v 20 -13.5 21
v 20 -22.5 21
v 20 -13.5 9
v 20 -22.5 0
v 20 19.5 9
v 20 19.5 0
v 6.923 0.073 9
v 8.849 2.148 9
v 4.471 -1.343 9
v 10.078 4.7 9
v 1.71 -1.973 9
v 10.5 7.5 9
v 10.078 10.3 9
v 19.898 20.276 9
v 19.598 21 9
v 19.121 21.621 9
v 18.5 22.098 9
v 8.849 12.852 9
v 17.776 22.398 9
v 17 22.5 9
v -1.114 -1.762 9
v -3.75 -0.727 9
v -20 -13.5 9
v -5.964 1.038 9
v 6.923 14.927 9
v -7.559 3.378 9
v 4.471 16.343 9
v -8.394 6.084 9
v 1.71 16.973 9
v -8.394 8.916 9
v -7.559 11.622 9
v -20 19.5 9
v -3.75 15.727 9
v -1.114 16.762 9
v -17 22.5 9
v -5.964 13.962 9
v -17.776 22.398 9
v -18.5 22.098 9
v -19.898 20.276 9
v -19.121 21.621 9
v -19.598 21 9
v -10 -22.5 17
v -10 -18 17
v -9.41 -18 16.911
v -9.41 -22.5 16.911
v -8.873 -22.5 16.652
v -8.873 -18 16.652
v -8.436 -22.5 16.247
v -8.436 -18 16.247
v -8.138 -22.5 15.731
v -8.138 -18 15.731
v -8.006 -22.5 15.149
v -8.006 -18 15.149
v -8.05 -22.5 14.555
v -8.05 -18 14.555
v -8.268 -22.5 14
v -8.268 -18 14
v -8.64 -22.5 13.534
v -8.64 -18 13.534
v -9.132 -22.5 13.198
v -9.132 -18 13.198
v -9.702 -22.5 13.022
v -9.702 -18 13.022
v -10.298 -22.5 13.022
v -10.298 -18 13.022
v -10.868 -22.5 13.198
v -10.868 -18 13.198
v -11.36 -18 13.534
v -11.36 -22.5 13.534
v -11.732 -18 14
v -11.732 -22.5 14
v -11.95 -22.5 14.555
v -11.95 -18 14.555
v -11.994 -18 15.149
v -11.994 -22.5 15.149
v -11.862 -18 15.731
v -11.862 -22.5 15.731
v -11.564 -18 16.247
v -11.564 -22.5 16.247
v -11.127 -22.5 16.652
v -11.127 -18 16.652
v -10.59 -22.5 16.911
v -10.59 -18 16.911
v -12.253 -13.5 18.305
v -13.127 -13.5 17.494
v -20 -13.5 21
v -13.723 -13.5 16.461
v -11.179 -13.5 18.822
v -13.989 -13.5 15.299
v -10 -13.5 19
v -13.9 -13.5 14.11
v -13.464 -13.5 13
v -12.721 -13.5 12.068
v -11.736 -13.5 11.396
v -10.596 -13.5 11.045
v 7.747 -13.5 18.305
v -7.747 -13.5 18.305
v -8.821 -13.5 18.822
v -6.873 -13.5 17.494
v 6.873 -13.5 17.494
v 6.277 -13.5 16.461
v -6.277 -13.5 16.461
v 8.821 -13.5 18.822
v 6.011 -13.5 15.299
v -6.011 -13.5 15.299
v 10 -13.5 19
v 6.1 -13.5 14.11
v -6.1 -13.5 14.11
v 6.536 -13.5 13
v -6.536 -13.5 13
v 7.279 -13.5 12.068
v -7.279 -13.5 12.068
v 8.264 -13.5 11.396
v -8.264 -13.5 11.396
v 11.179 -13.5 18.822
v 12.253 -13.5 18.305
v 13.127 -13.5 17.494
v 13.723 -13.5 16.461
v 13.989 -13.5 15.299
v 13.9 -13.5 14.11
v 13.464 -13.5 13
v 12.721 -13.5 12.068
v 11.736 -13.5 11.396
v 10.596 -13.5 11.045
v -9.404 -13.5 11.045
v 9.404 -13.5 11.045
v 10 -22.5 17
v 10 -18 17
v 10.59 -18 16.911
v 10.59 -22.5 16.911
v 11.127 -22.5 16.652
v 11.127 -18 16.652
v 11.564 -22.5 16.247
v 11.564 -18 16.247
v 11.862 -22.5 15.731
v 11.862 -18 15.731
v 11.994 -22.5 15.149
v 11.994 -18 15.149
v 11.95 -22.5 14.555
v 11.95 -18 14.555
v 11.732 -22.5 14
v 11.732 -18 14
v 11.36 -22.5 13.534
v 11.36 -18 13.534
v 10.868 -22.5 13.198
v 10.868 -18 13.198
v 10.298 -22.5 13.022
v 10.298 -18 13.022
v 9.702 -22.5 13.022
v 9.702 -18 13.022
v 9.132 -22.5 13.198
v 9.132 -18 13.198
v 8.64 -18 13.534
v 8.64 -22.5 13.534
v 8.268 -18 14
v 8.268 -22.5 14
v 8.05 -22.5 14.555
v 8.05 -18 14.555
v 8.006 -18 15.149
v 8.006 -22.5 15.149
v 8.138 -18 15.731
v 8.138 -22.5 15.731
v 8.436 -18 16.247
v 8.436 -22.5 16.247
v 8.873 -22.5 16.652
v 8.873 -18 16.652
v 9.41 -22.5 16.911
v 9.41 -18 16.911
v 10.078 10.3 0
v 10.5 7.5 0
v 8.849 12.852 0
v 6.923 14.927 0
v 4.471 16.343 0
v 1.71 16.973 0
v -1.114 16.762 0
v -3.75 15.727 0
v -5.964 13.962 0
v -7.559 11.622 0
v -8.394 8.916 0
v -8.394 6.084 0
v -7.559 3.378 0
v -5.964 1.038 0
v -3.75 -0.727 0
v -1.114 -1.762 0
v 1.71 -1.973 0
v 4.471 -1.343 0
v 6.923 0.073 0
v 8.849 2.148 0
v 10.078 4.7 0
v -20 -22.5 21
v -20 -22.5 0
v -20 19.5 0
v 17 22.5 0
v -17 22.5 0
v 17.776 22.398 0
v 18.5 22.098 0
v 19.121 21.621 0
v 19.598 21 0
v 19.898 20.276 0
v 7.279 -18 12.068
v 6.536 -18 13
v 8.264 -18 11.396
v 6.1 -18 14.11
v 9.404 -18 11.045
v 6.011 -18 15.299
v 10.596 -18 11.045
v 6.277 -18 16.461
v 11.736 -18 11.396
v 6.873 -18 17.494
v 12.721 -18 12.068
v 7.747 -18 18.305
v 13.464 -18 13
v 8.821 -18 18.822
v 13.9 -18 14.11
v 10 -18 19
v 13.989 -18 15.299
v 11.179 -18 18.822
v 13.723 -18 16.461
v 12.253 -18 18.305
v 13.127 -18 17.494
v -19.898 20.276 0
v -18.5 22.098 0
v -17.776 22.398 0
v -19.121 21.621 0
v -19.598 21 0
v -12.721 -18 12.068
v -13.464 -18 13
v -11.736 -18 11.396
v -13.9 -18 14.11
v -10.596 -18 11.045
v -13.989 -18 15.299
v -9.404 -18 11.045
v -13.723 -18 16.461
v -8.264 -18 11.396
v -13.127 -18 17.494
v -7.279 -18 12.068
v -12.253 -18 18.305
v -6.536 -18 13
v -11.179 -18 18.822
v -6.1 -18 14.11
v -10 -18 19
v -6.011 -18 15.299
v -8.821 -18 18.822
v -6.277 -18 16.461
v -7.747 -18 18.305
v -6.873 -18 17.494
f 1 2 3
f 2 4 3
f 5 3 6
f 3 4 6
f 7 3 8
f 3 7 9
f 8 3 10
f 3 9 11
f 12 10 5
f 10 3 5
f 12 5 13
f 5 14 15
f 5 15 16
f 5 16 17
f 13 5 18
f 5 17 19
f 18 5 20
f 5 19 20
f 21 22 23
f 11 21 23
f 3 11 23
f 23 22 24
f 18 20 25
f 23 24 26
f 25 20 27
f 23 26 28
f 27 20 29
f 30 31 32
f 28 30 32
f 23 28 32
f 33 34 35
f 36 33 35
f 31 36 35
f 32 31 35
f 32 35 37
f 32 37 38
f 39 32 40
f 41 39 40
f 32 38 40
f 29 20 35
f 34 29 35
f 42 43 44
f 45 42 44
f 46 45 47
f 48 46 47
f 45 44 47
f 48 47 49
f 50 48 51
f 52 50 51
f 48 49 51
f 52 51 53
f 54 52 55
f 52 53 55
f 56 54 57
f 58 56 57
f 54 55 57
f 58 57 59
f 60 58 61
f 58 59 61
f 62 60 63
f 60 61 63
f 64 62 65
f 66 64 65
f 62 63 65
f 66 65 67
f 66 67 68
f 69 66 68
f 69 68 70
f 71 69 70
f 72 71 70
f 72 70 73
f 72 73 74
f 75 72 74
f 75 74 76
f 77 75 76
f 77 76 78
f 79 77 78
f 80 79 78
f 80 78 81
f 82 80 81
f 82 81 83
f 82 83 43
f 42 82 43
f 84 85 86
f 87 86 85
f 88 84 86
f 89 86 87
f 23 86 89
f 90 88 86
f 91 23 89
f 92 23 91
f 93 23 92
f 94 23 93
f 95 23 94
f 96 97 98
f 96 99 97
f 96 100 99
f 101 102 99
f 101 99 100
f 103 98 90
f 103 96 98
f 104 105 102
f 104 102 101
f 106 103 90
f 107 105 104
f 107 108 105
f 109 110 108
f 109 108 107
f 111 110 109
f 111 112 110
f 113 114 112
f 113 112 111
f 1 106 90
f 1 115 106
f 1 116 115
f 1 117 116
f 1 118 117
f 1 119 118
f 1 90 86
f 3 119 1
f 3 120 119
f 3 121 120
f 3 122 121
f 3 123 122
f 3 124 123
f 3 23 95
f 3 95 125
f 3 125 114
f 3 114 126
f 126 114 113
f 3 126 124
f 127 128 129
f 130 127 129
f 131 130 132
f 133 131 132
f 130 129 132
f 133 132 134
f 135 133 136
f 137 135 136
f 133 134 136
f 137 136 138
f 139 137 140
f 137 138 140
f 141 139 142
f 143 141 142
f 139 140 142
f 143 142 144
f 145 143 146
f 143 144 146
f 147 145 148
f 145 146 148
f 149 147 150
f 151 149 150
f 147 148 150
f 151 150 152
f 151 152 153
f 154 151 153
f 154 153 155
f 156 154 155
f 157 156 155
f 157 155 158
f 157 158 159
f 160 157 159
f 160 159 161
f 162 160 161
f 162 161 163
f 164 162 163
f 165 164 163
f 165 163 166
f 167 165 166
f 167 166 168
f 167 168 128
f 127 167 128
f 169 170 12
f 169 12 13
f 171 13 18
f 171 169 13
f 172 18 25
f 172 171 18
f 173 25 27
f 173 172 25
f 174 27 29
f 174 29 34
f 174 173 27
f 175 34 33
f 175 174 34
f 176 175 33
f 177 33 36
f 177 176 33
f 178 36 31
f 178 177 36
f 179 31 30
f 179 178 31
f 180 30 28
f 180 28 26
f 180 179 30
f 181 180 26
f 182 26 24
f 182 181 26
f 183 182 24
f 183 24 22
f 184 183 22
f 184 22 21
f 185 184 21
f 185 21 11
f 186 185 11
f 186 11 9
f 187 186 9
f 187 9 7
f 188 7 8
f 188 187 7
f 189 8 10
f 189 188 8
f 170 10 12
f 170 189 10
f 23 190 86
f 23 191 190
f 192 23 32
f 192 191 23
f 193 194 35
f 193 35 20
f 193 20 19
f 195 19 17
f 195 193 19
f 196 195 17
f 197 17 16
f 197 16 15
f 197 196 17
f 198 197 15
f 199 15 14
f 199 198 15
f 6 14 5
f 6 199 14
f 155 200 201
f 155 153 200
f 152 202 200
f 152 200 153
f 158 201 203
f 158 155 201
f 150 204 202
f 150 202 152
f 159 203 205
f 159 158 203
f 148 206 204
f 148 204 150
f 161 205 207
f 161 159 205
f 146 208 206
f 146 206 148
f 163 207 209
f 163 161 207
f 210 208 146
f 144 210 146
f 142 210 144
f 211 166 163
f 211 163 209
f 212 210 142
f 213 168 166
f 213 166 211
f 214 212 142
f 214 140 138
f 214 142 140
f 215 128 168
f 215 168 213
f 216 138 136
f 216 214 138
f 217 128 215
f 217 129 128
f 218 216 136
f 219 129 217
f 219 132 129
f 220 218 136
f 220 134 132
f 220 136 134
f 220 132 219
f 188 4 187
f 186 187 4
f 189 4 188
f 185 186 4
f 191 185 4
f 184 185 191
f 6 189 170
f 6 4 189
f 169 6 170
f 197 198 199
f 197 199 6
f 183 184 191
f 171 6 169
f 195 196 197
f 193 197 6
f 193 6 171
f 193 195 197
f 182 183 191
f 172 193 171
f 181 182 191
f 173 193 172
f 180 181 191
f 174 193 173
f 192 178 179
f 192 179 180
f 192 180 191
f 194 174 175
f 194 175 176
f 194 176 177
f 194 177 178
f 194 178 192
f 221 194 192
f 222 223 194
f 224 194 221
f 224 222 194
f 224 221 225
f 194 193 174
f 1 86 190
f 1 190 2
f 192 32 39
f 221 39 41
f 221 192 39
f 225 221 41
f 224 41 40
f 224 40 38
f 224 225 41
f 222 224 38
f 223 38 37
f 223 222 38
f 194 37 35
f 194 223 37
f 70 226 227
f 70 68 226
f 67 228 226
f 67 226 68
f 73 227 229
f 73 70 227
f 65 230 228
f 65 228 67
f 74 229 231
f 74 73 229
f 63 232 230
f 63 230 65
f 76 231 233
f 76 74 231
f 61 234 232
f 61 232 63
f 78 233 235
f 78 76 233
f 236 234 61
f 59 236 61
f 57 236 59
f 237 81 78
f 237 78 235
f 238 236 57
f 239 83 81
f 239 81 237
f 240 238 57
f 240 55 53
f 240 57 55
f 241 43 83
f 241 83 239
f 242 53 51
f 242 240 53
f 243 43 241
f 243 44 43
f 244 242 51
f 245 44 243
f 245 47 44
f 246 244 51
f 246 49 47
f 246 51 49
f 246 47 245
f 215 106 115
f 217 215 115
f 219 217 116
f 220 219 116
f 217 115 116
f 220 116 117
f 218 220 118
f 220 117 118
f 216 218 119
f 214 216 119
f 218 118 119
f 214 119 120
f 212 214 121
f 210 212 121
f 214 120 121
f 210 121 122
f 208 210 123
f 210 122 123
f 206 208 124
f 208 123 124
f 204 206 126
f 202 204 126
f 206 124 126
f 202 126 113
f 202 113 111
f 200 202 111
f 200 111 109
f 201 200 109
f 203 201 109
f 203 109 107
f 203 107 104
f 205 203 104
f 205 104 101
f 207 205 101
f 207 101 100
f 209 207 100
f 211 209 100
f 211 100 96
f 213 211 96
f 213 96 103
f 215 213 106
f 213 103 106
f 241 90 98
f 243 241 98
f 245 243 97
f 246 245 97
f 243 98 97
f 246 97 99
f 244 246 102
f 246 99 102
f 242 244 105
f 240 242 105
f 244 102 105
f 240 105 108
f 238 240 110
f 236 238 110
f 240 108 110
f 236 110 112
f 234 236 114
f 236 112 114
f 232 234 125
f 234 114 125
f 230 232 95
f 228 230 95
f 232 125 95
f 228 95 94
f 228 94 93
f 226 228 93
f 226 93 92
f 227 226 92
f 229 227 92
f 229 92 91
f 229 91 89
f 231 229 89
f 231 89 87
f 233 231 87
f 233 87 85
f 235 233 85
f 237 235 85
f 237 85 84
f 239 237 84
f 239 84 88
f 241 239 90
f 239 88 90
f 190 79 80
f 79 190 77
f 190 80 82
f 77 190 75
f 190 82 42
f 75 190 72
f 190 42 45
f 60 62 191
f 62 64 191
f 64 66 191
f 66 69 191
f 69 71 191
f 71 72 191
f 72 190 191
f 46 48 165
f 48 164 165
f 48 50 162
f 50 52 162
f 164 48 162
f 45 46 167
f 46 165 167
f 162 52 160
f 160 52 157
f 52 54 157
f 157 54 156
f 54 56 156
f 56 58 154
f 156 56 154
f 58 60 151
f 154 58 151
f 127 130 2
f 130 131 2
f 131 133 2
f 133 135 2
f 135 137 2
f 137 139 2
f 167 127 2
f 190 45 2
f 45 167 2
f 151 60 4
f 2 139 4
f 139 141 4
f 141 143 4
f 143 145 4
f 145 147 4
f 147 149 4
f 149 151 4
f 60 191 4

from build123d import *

# Parameters (mm, degrees)
CROQUIS1_R              = 9.5
SALIENTE_EXTRUIR1_DEPTH = 9
CROQUIS3_W              = 40
CROQUIS3_H              = 9
SALIENTE_EXTRUIR2_DEPTH = 12
CROQUIS4_R              = 2
CORTAR_EXTRUIR1_DEPTH   = 47.227697325
CROQUIS5_R              = 4
CORTAR_EXTRUIR2_DEPTH   = 4.5


with BuildPart() as part:
    # Croquis1 → Saliente-Extruir1 (new body)
    with BuildSketch(Plane.XY):
        with BuildLine():
            Line((-17, 22.5), (17, 22.5))
            ThreePointArc((17, 22.5), (19.121320344, 21.621320344), (20, 19.5))
            Line((20, 19.5), (20, -22.5))
            Line((20, -22.5), (-20, -22.5))
            Line((-20, -22.5), (-20, 19.5))
            ThreePointArc((-20, 19.5), (-19.121320344, 21.621320344), (-17, 22.5))
        make_face()
        with Locations((1, 7.5)):
            Circle(CROQUIS1_R, mode=Mode.SUBTRACT)
    extrude(amount=SALIENTE_EXTRUIR1_DEPTH)

    # Croquis3 → Saliente-Extruir2 (add)
    with BuildSketch(Plane.XY.offset(9)):
        with Locations((0, -18)):
            Rectangle(CROQUIS3_W, CROQUIS3_H)
    extrude(amount=SALIENTE_EXTRUIR2_DEPTH)

    # Croquis4 → Cortar-Extruir1 (cut, through all)
    with BuildSketch(Plane(origin=(0, -13.5, 0), x_dir=(1, 0, 0), z_dir=(0, 1, 0))):
        with Locations(Location((-10, -15, 0), (0, 0, 270))):
            Circle(CROQUIS4_R)
        with Locations(Location((10, -15, 0), (0, 0, 270))):
            Circle(CROQUIS4_R)
    extrude(amount=-CORTAR_EXTRUIR1_DEPTH, mode=Mode.SUBTRACT)

    # Croquis5 → Cortar-Extruir2 (cut)
    with BuildSketch(Plane(origin=(0, -13.5, 0), x_dir=(1, 0, 0), z_dir=(0, 1, 0))):
        with Locations(Location((-10, -15, 0), (0, 0, 270))):
            Circle(CROQUIS5_R)
        with Locations(Location((10, -15, 0), (0, 0, 270))):
            Circle(CROQUIS5_R)
    extrude(amount=-CORTAR_EXTRUIR2_DEPTH, mode=Mode.SUBTRACT)


solid = part.part
